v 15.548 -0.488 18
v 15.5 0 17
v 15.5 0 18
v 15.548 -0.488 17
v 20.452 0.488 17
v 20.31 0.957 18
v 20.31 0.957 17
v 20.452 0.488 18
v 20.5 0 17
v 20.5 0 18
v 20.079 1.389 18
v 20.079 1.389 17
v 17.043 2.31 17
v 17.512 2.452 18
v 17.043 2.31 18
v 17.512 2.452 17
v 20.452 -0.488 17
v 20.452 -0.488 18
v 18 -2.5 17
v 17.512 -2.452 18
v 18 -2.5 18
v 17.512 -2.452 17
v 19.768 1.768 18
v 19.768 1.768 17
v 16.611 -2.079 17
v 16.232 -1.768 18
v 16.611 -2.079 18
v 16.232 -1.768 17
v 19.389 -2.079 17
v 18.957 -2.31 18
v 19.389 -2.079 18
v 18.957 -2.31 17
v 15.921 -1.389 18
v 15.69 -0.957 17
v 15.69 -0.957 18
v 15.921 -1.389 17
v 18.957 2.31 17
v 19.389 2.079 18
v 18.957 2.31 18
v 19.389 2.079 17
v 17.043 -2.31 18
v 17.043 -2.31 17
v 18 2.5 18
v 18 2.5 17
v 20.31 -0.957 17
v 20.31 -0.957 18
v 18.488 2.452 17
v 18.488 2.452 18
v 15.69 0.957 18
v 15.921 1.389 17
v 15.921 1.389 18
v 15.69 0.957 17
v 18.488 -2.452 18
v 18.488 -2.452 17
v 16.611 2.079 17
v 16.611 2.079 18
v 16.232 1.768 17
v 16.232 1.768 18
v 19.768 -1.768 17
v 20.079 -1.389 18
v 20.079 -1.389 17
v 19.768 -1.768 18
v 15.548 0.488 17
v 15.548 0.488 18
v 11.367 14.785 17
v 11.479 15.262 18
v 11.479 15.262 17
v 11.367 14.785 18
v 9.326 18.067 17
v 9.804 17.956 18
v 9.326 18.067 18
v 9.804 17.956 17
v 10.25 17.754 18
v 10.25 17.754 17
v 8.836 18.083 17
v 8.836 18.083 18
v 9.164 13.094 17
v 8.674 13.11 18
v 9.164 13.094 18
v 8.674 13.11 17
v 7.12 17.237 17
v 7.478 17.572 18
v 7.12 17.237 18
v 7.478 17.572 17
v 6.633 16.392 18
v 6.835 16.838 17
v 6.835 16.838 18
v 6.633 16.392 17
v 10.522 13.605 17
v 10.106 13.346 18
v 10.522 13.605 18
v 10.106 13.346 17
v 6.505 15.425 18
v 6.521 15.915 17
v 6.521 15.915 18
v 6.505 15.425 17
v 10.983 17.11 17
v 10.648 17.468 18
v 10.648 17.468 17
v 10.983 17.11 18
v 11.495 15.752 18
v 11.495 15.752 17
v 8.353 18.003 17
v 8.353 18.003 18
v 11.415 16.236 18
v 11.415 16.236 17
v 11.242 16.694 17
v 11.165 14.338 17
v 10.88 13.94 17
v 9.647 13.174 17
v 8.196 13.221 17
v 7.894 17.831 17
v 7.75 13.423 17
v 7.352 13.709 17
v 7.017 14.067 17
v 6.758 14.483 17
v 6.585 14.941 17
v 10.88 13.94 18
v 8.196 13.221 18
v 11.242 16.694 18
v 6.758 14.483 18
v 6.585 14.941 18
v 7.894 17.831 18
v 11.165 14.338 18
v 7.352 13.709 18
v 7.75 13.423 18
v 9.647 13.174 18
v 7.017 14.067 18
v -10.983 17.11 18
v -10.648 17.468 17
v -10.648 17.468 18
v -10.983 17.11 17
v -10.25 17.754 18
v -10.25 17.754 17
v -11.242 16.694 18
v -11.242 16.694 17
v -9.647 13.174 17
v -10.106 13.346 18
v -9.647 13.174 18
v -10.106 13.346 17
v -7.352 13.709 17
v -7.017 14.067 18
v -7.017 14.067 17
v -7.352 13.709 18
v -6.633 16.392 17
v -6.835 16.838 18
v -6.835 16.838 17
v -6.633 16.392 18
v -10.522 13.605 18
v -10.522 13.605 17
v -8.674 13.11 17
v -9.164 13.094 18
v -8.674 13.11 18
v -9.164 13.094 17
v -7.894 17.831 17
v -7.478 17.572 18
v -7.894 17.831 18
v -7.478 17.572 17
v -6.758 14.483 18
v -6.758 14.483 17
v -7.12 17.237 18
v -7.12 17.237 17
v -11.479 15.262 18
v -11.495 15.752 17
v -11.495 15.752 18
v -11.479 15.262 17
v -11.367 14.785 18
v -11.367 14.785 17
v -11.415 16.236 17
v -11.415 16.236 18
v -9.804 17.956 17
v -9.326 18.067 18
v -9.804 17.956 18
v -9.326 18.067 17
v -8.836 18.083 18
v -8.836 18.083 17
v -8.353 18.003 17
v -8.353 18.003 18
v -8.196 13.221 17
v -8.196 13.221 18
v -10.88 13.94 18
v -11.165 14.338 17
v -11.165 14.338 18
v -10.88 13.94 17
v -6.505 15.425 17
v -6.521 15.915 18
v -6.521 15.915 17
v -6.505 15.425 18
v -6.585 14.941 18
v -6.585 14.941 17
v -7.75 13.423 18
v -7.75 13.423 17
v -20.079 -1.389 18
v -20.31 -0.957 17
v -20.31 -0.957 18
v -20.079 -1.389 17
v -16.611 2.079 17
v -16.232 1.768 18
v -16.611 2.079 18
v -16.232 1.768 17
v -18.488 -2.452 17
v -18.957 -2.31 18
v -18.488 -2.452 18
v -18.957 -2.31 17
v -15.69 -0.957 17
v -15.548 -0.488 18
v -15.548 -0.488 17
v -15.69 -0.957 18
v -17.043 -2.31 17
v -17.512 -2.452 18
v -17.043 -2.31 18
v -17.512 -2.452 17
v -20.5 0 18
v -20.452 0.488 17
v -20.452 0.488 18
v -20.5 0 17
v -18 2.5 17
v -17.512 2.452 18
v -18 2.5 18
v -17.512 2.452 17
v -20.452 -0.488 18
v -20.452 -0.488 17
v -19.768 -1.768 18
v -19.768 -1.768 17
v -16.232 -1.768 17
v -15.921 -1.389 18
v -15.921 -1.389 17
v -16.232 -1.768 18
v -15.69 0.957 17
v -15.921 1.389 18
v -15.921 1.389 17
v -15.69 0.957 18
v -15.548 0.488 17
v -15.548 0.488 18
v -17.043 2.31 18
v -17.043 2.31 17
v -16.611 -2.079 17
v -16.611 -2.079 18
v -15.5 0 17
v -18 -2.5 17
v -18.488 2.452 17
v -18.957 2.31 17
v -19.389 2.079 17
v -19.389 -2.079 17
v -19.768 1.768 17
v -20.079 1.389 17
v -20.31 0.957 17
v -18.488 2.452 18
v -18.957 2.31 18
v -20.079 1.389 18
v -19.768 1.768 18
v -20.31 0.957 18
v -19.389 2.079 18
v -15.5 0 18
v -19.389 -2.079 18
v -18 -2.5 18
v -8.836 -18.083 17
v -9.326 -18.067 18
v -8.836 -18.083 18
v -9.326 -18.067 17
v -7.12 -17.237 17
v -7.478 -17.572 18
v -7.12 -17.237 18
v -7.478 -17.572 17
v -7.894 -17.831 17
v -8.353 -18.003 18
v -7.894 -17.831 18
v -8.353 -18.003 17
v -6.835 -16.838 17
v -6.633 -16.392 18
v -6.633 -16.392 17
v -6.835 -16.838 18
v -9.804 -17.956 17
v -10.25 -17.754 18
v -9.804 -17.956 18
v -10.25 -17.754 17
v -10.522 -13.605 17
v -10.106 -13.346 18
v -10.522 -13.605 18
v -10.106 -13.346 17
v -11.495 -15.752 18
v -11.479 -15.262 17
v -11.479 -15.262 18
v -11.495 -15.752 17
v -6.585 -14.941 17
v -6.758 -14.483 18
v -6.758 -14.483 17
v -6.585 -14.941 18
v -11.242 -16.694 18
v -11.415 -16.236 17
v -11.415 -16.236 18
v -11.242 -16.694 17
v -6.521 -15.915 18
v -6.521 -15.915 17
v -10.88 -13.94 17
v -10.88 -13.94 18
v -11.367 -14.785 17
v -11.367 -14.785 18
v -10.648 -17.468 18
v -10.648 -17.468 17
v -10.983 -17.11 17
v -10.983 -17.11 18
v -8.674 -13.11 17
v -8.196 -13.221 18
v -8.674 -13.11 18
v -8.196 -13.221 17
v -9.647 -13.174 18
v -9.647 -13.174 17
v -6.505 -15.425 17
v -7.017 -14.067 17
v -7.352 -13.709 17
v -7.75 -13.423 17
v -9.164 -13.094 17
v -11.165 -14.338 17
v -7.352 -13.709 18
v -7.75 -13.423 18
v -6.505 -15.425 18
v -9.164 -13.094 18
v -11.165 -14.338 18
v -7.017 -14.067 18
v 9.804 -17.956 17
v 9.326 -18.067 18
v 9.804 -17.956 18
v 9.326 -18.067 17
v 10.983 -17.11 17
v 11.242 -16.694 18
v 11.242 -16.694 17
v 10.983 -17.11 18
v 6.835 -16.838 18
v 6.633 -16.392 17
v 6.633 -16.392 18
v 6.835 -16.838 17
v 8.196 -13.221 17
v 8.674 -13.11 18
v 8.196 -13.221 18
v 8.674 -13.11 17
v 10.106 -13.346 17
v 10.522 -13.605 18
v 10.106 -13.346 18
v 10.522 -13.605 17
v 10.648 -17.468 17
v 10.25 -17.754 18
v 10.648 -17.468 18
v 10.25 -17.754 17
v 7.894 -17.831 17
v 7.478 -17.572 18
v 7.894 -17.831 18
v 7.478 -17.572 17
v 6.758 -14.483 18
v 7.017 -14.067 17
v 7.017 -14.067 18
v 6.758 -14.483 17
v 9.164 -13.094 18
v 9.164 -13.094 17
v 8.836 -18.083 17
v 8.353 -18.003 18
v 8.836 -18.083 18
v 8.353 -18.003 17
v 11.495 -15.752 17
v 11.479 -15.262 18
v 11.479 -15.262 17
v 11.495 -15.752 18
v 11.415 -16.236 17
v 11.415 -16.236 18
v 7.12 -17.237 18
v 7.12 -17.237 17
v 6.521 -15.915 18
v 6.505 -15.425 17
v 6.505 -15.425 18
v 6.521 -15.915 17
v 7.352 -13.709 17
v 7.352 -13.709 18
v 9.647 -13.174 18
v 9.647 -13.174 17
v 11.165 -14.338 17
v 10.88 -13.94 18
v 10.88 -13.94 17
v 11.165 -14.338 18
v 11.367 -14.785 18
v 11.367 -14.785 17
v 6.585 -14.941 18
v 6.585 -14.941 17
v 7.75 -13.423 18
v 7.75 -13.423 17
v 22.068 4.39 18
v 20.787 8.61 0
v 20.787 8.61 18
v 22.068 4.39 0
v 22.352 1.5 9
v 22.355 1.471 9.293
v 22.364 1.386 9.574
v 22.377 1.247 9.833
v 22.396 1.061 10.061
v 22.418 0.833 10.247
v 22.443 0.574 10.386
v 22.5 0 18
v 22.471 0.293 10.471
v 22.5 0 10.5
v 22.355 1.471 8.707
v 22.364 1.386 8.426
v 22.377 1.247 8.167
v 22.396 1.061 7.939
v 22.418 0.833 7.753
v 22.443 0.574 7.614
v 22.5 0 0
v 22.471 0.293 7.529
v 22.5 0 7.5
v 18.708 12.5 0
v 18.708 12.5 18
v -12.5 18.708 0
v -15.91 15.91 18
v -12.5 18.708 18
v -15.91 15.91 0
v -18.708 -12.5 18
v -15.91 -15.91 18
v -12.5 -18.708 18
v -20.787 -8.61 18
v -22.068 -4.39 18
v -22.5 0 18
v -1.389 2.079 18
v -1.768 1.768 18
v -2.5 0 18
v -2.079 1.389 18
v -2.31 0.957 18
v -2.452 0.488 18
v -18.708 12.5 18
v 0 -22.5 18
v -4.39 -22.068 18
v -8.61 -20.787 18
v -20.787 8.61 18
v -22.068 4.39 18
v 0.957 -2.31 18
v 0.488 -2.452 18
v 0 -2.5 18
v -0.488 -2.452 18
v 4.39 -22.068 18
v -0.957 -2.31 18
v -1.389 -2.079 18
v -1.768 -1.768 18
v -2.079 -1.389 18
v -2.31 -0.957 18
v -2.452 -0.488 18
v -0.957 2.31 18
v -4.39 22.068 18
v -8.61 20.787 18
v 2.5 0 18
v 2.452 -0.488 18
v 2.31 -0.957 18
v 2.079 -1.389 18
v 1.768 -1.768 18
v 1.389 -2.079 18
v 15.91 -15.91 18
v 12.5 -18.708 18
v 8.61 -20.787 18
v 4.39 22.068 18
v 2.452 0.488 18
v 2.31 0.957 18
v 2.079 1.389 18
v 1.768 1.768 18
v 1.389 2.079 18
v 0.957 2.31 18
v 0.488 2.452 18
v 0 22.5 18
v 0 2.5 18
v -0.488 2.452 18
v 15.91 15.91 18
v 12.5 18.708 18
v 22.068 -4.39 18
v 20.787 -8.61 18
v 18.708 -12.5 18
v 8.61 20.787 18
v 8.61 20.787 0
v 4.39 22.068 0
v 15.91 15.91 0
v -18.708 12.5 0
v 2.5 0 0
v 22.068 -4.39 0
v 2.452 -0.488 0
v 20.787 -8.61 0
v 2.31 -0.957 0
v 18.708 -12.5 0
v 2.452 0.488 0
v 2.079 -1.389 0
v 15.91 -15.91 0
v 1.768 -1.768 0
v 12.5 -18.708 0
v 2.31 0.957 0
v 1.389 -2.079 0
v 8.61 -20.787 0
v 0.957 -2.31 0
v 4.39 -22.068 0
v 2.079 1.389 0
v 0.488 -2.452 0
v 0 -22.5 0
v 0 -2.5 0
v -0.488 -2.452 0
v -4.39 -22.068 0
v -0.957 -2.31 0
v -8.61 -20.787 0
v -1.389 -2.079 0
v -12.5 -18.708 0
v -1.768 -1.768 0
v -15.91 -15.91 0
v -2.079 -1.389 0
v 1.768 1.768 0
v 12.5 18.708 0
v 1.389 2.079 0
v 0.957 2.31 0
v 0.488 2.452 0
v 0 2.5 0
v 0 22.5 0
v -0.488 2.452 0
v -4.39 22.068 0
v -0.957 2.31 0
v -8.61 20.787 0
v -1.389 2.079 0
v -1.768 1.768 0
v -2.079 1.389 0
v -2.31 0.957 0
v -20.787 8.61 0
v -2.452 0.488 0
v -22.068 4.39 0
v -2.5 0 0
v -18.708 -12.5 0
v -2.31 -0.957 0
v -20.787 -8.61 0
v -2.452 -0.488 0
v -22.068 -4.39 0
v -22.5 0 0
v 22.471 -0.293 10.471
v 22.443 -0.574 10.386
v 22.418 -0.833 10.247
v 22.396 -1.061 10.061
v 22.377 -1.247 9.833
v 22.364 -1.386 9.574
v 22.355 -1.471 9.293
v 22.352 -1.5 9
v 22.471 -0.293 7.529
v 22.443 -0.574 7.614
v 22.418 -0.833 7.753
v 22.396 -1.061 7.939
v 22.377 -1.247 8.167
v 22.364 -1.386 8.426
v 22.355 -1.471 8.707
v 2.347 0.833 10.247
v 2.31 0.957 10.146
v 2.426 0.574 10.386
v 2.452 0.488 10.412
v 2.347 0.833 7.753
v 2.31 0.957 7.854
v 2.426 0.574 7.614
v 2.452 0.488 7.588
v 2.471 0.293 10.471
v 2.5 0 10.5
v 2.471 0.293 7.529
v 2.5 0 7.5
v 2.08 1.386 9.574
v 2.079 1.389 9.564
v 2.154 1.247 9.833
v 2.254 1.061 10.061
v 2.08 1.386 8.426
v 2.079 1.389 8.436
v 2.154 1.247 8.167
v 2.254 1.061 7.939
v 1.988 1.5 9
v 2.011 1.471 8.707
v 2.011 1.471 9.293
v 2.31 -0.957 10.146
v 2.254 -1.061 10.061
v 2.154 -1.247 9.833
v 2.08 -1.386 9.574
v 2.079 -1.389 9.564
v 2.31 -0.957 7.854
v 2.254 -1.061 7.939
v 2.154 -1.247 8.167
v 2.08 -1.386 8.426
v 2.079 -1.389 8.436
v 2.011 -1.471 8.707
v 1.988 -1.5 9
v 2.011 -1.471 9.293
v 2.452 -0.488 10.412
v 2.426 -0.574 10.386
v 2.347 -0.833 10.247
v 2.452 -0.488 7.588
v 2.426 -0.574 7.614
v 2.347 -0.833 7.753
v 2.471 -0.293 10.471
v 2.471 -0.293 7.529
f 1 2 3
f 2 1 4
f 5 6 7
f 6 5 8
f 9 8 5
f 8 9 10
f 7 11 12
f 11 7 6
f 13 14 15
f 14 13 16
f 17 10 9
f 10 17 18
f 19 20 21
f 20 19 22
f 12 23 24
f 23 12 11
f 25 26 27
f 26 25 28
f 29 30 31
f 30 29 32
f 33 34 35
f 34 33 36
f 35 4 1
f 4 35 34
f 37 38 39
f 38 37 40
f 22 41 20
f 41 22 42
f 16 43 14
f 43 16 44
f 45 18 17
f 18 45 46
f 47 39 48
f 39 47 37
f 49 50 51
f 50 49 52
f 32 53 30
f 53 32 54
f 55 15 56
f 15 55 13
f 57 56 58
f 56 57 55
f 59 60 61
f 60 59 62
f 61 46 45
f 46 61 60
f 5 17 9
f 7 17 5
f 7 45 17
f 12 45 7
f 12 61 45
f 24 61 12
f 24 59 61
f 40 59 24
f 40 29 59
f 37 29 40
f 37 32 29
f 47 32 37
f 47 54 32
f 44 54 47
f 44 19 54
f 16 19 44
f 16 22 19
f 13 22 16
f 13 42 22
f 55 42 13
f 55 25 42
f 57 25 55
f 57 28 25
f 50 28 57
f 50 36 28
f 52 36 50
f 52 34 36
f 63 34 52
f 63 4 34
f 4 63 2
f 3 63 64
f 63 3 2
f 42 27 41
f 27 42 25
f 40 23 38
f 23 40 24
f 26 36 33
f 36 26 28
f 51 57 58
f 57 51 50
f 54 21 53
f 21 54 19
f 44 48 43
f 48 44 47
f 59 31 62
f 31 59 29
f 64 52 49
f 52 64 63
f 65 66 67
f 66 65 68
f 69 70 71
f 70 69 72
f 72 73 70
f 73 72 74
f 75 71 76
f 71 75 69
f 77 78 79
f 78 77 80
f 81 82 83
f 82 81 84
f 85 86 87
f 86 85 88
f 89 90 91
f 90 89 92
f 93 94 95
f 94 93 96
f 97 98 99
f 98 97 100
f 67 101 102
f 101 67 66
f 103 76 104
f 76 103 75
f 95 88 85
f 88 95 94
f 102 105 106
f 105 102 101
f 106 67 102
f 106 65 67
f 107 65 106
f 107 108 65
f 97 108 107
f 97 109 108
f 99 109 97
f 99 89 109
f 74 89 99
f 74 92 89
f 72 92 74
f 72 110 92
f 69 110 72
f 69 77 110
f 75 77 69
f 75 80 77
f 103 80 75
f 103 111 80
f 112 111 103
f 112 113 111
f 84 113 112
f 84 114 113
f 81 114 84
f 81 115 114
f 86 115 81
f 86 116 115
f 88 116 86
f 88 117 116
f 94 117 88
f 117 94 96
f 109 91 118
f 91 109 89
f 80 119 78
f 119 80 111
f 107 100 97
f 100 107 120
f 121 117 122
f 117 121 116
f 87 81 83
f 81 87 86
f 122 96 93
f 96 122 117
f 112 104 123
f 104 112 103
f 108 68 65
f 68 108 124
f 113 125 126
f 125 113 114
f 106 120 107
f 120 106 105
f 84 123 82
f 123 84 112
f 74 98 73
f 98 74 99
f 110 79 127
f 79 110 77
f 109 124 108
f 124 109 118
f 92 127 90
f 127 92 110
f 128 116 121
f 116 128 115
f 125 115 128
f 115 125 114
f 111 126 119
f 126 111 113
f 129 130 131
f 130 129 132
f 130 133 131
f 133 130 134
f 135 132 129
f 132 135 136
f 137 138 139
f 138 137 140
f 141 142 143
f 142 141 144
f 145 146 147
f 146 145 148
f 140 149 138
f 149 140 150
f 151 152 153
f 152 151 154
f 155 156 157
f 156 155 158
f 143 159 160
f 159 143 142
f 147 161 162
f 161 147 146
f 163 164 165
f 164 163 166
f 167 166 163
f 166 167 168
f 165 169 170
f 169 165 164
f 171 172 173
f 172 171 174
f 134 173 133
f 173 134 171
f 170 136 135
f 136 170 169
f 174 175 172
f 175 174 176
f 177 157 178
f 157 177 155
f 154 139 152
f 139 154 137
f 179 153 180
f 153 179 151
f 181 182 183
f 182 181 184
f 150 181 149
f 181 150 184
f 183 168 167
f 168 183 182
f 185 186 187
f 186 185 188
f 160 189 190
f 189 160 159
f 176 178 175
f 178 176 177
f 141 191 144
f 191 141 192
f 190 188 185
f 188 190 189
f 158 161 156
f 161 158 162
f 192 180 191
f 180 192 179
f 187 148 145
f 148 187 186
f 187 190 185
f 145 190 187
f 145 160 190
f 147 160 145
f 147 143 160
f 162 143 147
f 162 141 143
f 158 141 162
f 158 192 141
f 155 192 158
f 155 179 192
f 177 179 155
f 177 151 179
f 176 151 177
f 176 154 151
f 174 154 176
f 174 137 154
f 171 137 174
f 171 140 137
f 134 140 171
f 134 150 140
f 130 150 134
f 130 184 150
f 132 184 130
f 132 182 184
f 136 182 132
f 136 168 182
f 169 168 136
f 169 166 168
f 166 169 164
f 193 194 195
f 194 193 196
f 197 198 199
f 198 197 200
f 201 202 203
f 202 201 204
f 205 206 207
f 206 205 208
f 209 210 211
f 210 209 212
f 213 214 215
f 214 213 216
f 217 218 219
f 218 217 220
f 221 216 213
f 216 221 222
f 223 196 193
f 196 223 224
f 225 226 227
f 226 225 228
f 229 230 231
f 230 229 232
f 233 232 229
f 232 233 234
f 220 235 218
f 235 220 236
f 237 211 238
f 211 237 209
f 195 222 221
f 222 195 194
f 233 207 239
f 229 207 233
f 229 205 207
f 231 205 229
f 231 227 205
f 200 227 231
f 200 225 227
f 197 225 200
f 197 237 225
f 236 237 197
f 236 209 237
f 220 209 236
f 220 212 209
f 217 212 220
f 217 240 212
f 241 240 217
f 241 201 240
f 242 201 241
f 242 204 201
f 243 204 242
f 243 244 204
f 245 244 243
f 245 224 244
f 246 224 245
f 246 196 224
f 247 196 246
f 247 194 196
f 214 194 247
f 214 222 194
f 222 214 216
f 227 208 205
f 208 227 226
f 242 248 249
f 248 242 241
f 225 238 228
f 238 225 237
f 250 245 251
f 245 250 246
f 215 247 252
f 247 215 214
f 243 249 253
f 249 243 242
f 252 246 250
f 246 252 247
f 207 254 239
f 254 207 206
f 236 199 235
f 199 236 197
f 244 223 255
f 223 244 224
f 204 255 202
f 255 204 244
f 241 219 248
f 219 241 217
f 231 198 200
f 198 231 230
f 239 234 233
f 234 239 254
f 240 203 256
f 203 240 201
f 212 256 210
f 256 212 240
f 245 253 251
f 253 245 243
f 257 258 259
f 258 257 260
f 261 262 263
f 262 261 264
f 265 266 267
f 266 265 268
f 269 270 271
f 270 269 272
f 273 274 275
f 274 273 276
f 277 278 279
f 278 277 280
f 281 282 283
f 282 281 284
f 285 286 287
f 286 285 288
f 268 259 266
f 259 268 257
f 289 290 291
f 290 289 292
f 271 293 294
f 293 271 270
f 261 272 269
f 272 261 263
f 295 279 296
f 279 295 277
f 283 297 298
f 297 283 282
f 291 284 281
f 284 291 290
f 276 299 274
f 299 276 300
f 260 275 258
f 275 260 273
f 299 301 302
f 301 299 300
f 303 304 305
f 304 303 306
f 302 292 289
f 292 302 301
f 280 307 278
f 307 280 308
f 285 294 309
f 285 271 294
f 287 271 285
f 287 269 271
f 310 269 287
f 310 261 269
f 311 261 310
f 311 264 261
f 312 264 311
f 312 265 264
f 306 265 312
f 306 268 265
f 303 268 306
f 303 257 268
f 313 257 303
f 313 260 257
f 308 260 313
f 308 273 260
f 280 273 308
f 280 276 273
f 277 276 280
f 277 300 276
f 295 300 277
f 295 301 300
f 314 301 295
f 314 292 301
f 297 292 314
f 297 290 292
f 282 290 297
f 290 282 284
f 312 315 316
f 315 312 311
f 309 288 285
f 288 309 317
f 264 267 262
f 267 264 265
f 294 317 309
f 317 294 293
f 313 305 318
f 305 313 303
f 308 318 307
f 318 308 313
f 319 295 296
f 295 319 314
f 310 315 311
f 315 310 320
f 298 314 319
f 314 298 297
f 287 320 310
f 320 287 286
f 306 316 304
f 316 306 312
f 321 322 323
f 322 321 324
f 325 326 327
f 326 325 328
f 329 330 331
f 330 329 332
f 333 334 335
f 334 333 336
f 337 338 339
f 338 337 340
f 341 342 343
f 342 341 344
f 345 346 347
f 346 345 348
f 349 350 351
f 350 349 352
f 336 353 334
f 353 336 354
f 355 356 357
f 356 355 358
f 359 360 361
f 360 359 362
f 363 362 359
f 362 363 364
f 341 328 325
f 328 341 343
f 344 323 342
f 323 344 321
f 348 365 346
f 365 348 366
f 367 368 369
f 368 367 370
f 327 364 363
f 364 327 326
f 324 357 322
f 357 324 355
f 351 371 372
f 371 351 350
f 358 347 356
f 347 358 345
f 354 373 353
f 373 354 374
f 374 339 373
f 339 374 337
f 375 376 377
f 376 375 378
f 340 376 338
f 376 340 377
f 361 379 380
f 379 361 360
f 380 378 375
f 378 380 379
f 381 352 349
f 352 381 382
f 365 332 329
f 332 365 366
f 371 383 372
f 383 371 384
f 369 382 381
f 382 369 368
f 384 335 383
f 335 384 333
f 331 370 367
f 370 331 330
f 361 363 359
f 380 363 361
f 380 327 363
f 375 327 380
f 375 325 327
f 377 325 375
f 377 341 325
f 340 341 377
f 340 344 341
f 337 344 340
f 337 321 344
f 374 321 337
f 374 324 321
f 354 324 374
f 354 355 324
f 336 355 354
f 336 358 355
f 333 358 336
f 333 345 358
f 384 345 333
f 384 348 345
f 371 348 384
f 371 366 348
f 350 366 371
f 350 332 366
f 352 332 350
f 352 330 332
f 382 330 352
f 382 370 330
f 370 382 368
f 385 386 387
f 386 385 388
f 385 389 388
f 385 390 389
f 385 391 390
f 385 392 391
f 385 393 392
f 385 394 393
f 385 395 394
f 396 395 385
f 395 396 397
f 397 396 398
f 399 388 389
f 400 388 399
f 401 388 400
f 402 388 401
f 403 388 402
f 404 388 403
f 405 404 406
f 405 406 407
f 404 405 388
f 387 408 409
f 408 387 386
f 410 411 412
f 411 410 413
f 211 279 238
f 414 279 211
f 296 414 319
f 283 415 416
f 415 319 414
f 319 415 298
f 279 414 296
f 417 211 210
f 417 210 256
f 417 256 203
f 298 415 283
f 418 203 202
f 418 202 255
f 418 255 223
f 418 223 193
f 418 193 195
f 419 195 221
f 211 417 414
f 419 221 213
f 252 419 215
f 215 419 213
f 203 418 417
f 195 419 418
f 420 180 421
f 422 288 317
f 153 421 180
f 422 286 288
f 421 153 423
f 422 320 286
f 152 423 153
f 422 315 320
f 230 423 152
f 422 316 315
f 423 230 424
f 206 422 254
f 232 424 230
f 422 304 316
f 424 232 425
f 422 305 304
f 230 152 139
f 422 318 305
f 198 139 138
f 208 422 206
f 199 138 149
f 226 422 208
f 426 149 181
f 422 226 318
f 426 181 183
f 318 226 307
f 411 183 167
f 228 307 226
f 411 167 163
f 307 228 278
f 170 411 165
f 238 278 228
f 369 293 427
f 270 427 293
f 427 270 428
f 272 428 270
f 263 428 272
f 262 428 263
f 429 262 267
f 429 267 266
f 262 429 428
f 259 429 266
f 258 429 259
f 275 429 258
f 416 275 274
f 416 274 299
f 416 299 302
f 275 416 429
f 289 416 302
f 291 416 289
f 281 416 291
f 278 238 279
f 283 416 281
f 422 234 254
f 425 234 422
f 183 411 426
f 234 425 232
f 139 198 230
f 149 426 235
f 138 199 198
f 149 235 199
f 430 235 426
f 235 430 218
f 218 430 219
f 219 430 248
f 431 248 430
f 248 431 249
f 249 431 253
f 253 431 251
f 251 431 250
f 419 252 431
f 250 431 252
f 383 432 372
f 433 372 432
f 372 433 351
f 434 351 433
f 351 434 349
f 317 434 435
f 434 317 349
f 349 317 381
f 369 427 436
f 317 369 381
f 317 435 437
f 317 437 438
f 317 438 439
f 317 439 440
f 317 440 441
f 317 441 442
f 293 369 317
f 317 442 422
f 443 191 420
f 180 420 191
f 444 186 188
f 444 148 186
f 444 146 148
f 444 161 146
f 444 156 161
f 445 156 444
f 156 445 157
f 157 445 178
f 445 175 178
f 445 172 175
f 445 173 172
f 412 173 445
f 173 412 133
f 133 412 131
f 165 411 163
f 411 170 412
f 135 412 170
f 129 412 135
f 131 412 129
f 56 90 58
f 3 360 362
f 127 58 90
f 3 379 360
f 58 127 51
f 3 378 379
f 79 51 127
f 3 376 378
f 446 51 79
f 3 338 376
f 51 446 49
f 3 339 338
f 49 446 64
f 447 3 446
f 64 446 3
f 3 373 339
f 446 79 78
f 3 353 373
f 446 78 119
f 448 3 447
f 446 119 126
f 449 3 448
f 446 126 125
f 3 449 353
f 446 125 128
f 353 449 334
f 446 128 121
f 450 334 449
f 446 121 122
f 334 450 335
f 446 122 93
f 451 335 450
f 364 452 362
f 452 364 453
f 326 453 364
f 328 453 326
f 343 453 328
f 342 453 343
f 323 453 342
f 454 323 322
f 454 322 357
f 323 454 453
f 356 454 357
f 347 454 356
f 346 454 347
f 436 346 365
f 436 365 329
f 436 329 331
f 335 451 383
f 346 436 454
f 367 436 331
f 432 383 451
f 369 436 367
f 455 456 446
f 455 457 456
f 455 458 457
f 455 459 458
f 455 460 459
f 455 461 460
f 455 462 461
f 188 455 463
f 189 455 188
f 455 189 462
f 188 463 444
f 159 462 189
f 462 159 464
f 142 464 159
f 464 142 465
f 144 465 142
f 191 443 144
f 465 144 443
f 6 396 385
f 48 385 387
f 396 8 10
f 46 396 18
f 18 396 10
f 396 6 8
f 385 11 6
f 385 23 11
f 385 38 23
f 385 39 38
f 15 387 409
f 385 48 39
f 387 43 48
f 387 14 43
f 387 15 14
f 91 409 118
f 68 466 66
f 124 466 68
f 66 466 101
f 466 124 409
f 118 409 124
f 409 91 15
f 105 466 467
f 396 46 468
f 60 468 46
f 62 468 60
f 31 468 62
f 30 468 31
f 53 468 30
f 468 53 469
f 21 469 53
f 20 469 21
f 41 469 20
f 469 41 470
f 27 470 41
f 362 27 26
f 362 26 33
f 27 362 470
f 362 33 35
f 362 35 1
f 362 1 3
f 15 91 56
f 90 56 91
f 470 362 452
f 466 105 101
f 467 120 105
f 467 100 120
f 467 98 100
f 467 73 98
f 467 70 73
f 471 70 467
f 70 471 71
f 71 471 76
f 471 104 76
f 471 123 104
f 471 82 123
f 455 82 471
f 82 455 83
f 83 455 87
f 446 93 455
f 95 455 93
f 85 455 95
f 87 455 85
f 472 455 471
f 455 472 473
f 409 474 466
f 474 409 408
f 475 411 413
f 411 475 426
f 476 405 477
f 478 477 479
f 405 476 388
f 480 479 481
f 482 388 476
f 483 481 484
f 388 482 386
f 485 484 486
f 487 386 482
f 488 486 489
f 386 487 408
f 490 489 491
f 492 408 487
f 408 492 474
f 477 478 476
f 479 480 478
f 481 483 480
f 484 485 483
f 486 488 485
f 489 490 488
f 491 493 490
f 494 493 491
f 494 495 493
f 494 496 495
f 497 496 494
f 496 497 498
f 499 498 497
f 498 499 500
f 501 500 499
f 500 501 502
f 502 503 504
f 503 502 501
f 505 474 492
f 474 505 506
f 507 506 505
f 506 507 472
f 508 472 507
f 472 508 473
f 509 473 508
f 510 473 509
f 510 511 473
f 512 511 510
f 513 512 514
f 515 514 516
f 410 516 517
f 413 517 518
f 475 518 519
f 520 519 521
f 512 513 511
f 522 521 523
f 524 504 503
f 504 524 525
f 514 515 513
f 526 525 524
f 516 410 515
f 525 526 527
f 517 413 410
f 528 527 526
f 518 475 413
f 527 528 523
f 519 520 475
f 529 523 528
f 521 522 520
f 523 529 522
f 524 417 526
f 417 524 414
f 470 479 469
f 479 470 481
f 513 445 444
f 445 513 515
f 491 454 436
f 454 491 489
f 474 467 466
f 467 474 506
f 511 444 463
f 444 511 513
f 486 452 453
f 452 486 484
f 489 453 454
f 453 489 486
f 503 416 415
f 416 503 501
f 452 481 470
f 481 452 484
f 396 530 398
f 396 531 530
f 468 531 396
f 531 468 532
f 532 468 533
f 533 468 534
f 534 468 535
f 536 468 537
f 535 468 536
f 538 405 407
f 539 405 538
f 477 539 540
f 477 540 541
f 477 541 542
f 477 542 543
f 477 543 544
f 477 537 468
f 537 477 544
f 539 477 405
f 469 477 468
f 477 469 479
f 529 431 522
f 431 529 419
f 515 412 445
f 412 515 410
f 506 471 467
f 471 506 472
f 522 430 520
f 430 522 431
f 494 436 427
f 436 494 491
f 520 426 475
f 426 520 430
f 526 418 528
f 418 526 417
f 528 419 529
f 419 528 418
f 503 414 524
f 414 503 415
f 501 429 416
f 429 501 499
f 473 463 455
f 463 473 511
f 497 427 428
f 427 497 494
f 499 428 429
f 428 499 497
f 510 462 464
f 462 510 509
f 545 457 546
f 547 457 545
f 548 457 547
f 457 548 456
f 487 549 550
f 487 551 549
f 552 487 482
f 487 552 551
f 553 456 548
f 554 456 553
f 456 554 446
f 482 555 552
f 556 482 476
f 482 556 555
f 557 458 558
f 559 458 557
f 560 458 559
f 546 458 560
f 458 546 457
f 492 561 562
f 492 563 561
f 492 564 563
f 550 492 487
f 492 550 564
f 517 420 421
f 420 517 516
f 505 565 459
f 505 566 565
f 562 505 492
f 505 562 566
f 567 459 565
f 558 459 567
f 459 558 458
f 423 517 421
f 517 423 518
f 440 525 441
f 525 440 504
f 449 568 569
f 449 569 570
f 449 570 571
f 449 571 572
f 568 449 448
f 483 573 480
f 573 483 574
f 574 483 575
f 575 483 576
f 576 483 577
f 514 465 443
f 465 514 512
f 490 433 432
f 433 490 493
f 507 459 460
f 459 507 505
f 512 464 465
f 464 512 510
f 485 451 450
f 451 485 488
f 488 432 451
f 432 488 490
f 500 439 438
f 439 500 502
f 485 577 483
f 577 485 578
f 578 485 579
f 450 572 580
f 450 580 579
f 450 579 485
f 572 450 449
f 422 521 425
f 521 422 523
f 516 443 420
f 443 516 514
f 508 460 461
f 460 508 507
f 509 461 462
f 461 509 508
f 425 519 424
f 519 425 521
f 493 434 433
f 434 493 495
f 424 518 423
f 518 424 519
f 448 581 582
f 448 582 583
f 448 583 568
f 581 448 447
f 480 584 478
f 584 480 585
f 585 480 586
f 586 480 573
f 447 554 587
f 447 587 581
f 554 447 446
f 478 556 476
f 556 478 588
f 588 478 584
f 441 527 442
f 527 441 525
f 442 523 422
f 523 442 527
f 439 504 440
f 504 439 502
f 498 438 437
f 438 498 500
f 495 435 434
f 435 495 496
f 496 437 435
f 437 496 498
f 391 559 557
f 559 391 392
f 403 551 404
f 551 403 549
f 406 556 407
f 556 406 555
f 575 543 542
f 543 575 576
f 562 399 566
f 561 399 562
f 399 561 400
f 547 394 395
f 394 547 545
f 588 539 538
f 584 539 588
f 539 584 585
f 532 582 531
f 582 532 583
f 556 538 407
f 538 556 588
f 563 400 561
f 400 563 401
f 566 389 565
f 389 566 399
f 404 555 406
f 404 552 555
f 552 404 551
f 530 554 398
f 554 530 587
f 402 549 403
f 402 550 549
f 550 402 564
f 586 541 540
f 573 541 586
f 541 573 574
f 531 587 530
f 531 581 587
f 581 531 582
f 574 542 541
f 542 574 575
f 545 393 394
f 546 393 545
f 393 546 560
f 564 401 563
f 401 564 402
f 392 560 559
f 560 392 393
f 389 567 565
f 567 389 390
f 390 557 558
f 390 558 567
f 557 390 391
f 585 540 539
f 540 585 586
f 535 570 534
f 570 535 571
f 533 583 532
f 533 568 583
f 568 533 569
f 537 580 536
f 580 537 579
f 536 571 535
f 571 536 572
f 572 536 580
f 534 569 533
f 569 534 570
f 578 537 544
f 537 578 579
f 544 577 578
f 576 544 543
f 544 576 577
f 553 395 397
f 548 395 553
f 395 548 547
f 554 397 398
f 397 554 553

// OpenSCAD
$fn = 32;

// ----------------------------------------------------------------------
// Control knob: dimpled knob
// ----------------------------------------------------------------------

// --- parameters (mm) ---
dimp_d = 5;               // finger dimple diameter
n_dimp = 6;               // number of dimples
dimp_r = 18;              // dimple ring radius
knob_d = 45;              // knob body diameter
knob_h = 18;              // knob body height
bore_d = 5;               // shaft bore diameter
set_d = 3;                // set screw bore diameter

dimp_step = 360 / n_dimp;  // dimple angular step

difference() {
  cylinder(h = knob_h, d = knob_d);
  translate([0, 0, -1]) cylinder(h = knob_h + 2, d = bore_d);
  translate([-1, 0, knob_h / 2]) rotate([0, 90, 0])
    cylinder(h = knob_d / 2 + bore_d / 2 + 2, d = set_d);  for (i = [0 : n_dimp - 1])
    rotate([0, 0, i * dimp_step])
      translate([dimp_r, 0, knob_h - 1])
        cylinder(h = 2, d = dimp_d);
}
